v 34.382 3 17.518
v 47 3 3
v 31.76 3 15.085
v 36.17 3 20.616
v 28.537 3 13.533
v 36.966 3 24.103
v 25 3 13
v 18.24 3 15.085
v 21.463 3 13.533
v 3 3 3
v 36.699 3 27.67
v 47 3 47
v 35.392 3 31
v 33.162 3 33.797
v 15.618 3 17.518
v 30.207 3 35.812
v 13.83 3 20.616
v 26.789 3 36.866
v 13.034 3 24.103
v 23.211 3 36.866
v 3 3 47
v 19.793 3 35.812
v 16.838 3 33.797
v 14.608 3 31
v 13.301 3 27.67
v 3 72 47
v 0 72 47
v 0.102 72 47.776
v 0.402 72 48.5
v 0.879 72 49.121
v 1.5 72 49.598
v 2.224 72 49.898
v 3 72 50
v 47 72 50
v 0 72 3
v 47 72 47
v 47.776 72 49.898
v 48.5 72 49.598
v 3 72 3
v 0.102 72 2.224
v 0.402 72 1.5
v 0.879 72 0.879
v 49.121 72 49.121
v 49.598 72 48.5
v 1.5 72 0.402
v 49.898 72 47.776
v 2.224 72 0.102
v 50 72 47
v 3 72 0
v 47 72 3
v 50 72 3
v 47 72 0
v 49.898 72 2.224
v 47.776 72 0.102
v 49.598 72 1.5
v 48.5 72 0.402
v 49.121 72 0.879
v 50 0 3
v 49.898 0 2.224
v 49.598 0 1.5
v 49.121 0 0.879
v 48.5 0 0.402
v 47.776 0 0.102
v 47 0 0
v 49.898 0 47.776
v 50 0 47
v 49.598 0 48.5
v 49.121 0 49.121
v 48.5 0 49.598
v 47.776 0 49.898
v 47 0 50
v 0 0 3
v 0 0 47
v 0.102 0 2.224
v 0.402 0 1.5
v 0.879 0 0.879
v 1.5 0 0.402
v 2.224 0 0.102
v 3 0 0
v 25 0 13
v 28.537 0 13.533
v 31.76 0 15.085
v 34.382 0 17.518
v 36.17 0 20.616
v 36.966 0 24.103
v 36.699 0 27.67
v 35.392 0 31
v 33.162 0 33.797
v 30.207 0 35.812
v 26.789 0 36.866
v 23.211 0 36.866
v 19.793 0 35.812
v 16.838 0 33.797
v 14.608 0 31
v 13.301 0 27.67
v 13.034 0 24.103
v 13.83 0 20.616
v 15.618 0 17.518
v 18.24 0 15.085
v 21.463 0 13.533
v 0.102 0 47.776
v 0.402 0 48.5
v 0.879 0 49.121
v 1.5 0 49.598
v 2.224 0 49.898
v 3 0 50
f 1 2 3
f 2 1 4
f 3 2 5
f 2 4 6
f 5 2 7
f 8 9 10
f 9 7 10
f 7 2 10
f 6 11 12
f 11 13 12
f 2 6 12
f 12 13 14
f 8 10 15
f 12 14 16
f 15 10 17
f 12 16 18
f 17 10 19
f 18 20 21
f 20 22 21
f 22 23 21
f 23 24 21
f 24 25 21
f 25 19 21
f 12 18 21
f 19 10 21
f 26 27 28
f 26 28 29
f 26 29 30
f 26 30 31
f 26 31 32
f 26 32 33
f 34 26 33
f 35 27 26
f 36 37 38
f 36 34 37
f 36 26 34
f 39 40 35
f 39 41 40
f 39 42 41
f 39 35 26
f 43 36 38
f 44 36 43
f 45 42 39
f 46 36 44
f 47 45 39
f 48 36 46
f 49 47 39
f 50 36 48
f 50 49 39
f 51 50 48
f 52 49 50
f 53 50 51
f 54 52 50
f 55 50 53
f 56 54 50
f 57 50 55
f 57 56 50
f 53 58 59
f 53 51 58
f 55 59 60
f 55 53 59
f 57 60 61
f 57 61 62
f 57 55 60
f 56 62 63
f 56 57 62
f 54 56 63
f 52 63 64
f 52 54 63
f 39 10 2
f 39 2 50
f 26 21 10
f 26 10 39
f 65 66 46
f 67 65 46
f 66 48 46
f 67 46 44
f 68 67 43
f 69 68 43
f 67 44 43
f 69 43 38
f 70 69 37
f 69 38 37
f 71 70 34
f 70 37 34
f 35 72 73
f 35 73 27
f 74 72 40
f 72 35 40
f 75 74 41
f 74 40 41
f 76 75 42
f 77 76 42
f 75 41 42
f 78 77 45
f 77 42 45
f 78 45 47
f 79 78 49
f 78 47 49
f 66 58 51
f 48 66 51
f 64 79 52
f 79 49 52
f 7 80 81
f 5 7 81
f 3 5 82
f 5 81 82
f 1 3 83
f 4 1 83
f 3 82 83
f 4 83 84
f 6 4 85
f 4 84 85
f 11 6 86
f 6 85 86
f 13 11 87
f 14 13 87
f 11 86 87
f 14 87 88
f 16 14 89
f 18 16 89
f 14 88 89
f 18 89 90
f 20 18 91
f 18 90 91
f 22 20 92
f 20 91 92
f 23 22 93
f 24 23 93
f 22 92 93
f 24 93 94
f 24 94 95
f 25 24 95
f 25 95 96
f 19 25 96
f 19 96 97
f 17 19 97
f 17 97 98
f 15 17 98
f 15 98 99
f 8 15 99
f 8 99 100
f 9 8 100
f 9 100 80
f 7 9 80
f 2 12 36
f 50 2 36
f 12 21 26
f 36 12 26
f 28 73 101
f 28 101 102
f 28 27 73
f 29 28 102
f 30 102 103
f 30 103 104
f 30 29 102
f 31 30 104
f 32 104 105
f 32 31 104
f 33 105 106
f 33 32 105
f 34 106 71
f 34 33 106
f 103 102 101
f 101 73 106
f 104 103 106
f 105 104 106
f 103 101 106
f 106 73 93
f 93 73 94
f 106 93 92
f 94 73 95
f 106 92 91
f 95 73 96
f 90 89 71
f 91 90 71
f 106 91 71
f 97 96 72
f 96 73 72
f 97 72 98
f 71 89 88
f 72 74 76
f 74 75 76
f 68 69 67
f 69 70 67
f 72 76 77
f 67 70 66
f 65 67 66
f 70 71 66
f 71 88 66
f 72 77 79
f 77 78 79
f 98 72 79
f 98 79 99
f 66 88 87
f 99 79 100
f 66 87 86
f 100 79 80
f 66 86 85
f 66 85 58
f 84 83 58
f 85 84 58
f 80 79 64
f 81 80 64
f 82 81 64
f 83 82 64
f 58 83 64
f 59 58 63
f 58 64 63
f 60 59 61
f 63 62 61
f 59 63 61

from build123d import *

# Parameters (mm, degrees)
SKETCH_1_W              = 50
SKETCH_1_H              = 72
STEPPER_COVER_DEPTH     = 50
FILLET_2_R              = 3
SHELL_START             = 3
SHELL_1_OUTLINE_W       = 69
SHELL_1_OUTLINE_H       = 44
SHELL_1_DEPTH           = 44
SKETCH_2_R              = 12
COUPLER_CLEARANCE_DEPTH = 3.1


# Read off the part's stored shape, not the designer's step: 抽壳1
with BuildPart() as part:
    # 草图1 → Stepper_cover (new body)
    with BuildSketch(Plane.XY):
        with Locations((25, 36)):
            Rectangle(SKETCH_1_W, SKETCH_1_H)
    extrude(amount=STEPPER_COVER_DEPTH)

    # Fillet 2
    fillet_2_edges = [part.edges().sort_by_distance(p)[0] for p in [
        (50, 36, 50),
        (0, 36, 50),
        (50, 36, 0),
        (0, 36, 0),
    ]]
    fillet(fillet_2_edges, radius=FILLET_2_R)

    # 抽壳1 outline → 抽壳1 (cut)
    with BuildSketch(Plane.YZ.offset(SHELL_START)):
        with Locations((37.5, 25)):
            Rectangle(SHELL_1_OUTLINE_W, SHELL_1_OUTLINE_H)
    extrude(amount=SHELL_1_DEPTH, mode=Mode.SUBTRACT)

    # 草图2 → Coupler_clearance (cut)
    with BuildSketch(Plane.XZ):
        with Locations(Location((25, 25, 0), (0, 0, 270))):
            Circle(SKETCH_2_R)
    extrude(amount=-COUPLER_CLEARANCE_DEPTH, mode=Mode.SUBTRACT)


solid = part.part
